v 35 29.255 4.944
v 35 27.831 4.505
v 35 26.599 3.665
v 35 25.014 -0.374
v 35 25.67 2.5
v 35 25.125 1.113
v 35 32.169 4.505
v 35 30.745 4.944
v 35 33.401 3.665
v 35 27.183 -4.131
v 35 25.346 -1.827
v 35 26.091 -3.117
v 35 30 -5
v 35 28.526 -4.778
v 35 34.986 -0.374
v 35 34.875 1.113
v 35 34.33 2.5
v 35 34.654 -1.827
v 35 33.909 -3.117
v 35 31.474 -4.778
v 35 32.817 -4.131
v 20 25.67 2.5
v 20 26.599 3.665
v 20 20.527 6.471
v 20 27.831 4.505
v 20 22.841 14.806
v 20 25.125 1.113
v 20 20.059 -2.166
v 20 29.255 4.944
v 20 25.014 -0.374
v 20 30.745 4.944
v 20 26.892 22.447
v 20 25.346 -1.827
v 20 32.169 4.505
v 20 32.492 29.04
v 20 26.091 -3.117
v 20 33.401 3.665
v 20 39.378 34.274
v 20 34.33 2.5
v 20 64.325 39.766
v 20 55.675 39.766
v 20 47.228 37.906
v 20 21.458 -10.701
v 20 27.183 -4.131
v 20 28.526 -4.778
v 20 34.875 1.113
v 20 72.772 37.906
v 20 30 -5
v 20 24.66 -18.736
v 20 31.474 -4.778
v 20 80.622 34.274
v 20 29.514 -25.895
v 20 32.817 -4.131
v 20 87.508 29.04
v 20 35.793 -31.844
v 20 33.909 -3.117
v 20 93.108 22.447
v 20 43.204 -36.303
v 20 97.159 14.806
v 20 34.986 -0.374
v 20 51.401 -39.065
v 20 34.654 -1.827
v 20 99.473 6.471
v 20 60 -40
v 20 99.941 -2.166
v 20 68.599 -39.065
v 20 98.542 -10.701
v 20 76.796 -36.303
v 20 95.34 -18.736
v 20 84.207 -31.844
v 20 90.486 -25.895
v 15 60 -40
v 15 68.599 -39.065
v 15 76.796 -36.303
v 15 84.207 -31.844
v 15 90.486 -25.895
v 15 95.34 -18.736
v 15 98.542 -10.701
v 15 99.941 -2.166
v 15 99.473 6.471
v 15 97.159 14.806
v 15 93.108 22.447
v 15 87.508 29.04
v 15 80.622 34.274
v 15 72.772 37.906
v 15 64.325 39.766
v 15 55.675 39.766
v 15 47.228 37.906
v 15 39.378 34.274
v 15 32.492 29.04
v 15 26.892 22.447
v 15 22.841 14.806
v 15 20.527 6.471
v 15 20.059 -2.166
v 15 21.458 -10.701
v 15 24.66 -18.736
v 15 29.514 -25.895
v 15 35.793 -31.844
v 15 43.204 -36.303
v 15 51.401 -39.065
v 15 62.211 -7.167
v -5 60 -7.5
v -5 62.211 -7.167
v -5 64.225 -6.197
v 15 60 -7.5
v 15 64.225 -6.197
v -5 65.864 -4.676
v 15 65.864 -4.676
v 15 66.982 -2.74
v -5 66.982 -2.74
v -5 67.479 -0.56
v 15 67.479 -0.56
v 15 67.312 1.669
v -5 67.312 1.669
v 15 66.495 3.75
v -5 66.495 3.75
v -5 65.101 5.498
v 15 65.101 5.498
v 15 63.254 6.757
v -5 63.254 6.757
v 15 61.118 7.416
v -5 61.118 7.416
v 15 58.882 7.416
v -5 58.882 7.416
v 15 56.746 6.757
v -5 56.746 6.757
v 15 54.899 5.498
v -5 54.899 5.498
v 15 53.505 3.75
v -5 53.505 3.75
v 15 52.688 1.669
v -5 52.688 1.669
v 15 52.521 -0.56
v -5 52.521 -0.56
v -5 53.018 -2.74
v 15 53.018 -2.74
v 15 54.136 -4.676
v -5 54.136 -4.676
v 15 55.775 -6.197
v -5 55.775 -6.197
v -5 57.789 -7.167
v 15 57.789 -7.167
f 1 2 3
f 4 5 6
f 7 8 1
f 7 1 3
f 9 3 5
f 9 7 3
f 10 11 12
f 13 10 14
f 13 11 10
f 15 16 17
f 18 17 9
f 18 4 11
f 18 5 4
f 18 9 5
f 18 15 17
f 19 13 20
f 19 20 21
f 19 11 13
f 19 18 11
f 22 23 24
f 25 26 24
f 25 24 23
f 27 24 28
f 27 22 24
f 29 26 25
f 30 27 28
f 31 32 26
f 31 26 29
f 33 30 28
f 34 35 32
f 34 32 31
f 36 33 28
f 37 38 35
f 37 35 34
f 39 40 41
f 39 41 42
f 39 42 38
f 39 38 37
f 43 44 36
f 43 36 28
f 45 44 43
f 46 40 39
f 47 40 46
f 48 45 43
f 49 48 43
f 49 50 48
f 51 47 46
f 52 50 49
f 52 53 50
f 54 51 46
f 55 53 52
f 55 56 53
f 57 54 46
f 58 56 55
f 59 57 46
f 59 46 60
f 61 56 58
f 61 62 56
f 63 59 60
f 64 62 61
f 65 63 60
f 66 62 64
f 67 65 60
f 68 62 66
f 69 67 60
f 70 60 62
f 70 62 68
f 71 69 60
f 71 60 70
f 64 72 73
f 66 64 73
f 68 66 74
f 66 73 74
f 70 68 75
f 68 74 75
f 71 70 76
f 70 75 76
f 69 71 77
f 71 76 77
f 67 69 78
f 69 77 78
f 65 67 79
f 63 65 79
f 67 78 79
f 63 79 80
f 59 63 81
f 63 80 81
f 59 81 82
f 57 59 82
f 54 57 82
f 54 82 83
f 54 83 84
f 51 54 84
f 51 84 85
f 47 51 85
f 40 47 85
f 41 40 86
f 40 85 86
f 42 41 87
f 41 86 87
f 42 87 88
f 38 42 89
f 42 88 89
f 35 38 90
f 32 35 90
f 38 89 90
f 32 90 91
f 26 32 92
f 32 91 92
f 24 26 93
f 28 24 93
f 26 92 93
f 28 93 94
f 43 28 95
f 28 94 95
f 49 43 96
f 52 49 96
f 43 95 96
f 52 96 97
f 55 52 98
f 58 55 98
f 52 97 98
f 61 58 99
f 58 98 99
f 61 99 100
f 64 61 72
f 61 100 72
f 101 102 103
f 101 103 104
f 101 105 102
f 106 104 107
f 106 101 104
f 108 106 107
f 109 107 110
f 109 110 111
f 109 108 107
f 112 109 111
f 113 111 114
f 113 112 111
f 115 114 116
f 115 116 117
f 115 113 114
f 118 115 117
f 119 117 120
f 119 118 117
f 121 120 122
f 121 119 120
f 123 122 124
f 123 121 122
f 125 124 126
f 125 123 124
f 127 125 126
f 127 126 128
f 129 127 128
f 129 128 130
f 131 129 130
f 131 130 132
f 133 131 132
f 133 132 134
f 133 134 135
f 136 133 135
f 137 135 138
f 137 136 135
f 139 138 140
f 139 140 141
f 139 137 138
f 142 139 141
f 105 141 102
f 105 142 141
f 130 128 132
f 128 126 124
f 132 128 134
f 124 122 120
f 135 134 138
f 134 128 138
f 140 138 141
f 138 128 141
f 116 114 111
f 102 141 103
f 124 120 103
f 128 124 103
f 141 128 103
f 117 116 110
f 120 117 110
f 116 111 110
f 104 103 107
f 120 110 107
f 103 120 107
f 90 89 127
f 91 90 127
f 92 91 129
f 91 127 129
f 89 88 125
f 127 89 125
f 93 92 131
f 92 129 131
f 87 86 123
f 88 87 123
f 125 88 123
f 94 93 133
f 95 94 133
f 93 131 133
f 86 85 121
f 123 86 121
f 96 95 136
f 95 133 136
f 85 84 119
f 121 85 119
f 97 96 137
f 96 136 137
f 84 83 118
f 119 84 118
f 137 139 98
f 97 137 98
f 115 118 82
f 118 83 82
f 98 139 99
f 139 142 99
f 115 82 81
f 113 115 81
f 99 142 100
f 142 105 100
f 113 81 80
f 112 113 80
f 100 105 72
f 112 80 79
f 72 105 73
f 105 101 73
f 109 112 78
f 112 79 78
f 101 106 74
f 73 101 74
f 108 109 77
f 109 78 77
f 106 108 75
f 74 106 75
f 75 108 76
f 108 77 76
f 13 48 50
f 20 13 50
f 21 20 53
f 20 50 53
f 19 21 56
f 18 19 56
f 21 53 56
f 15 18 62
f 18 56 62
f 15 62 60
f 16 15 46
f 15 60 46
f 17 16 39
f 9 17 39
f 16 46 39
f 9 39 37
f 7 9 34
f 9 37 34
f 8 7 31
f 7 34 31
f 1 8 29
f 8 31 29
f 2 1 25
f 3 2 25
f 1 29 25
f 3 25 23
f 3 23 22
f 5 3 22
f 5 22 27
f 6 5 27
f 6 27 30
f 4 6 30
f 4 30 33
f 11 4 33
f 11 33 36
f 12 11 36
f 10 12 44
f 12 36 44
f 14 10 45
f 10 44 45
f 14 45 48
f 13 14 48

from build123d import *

# Parameters (mm, degrees)
SKETCH2_R                = 7.5
BOSS_EXTRUDE1_DEPTH      = 5
BOSS_EXTRUDE1_DEPTH_BACK = 15
SKETCH3_R                = 40
BOSS_EXTRUDE2_DEPTH      = 5
SKETCH4_R                = 5
BOSS_EXTRUDE3_DEPTH      = 15


with BuildPart() as part:
    # Sketch2 → Boss-Extrude1 (new body, two sides)
    with BuildSketch(Plane(origin=(10, 0, 0), x_dir=(0, 0, -1), z_dir=(1, 0, 0))) as boss_extrude1_sk:
        with Locations((0, 60)):
            Circle(SKETCH2_R)
    extrude(amount=BOSS_EXTRUDE1_DEPTH)
    extrude(boss_extrude1_sk.sketch, amount=-BOSS_EXTRUDE1_DEPTH_BACK)

    # Sketch3 → Boss-Extrude2 (add)
    with BuildSketch(Plane(origin=(15, 0, 0), x_dir=(0, 0, -1), z_dir=(1, 0, 0))):
        with Locations((0, 60)):
            Circle(SKETCH3_R)
    extrude(amount=BOSS_EXTRUDE2_DEPTH)

    # Sketch4 → Boss-Extrude3 (add)
    with BuildSketch(Plane(origin=(20, 0, 0), x_dir=(0, 0, -1), z_dir=(1, 0, 0))):
        with Locations((0, 30)):
            Circle(SKETCH4_R)
    extrude(amount=BOSS_EXTRUDE3_DEPTH)


solid = part.part
